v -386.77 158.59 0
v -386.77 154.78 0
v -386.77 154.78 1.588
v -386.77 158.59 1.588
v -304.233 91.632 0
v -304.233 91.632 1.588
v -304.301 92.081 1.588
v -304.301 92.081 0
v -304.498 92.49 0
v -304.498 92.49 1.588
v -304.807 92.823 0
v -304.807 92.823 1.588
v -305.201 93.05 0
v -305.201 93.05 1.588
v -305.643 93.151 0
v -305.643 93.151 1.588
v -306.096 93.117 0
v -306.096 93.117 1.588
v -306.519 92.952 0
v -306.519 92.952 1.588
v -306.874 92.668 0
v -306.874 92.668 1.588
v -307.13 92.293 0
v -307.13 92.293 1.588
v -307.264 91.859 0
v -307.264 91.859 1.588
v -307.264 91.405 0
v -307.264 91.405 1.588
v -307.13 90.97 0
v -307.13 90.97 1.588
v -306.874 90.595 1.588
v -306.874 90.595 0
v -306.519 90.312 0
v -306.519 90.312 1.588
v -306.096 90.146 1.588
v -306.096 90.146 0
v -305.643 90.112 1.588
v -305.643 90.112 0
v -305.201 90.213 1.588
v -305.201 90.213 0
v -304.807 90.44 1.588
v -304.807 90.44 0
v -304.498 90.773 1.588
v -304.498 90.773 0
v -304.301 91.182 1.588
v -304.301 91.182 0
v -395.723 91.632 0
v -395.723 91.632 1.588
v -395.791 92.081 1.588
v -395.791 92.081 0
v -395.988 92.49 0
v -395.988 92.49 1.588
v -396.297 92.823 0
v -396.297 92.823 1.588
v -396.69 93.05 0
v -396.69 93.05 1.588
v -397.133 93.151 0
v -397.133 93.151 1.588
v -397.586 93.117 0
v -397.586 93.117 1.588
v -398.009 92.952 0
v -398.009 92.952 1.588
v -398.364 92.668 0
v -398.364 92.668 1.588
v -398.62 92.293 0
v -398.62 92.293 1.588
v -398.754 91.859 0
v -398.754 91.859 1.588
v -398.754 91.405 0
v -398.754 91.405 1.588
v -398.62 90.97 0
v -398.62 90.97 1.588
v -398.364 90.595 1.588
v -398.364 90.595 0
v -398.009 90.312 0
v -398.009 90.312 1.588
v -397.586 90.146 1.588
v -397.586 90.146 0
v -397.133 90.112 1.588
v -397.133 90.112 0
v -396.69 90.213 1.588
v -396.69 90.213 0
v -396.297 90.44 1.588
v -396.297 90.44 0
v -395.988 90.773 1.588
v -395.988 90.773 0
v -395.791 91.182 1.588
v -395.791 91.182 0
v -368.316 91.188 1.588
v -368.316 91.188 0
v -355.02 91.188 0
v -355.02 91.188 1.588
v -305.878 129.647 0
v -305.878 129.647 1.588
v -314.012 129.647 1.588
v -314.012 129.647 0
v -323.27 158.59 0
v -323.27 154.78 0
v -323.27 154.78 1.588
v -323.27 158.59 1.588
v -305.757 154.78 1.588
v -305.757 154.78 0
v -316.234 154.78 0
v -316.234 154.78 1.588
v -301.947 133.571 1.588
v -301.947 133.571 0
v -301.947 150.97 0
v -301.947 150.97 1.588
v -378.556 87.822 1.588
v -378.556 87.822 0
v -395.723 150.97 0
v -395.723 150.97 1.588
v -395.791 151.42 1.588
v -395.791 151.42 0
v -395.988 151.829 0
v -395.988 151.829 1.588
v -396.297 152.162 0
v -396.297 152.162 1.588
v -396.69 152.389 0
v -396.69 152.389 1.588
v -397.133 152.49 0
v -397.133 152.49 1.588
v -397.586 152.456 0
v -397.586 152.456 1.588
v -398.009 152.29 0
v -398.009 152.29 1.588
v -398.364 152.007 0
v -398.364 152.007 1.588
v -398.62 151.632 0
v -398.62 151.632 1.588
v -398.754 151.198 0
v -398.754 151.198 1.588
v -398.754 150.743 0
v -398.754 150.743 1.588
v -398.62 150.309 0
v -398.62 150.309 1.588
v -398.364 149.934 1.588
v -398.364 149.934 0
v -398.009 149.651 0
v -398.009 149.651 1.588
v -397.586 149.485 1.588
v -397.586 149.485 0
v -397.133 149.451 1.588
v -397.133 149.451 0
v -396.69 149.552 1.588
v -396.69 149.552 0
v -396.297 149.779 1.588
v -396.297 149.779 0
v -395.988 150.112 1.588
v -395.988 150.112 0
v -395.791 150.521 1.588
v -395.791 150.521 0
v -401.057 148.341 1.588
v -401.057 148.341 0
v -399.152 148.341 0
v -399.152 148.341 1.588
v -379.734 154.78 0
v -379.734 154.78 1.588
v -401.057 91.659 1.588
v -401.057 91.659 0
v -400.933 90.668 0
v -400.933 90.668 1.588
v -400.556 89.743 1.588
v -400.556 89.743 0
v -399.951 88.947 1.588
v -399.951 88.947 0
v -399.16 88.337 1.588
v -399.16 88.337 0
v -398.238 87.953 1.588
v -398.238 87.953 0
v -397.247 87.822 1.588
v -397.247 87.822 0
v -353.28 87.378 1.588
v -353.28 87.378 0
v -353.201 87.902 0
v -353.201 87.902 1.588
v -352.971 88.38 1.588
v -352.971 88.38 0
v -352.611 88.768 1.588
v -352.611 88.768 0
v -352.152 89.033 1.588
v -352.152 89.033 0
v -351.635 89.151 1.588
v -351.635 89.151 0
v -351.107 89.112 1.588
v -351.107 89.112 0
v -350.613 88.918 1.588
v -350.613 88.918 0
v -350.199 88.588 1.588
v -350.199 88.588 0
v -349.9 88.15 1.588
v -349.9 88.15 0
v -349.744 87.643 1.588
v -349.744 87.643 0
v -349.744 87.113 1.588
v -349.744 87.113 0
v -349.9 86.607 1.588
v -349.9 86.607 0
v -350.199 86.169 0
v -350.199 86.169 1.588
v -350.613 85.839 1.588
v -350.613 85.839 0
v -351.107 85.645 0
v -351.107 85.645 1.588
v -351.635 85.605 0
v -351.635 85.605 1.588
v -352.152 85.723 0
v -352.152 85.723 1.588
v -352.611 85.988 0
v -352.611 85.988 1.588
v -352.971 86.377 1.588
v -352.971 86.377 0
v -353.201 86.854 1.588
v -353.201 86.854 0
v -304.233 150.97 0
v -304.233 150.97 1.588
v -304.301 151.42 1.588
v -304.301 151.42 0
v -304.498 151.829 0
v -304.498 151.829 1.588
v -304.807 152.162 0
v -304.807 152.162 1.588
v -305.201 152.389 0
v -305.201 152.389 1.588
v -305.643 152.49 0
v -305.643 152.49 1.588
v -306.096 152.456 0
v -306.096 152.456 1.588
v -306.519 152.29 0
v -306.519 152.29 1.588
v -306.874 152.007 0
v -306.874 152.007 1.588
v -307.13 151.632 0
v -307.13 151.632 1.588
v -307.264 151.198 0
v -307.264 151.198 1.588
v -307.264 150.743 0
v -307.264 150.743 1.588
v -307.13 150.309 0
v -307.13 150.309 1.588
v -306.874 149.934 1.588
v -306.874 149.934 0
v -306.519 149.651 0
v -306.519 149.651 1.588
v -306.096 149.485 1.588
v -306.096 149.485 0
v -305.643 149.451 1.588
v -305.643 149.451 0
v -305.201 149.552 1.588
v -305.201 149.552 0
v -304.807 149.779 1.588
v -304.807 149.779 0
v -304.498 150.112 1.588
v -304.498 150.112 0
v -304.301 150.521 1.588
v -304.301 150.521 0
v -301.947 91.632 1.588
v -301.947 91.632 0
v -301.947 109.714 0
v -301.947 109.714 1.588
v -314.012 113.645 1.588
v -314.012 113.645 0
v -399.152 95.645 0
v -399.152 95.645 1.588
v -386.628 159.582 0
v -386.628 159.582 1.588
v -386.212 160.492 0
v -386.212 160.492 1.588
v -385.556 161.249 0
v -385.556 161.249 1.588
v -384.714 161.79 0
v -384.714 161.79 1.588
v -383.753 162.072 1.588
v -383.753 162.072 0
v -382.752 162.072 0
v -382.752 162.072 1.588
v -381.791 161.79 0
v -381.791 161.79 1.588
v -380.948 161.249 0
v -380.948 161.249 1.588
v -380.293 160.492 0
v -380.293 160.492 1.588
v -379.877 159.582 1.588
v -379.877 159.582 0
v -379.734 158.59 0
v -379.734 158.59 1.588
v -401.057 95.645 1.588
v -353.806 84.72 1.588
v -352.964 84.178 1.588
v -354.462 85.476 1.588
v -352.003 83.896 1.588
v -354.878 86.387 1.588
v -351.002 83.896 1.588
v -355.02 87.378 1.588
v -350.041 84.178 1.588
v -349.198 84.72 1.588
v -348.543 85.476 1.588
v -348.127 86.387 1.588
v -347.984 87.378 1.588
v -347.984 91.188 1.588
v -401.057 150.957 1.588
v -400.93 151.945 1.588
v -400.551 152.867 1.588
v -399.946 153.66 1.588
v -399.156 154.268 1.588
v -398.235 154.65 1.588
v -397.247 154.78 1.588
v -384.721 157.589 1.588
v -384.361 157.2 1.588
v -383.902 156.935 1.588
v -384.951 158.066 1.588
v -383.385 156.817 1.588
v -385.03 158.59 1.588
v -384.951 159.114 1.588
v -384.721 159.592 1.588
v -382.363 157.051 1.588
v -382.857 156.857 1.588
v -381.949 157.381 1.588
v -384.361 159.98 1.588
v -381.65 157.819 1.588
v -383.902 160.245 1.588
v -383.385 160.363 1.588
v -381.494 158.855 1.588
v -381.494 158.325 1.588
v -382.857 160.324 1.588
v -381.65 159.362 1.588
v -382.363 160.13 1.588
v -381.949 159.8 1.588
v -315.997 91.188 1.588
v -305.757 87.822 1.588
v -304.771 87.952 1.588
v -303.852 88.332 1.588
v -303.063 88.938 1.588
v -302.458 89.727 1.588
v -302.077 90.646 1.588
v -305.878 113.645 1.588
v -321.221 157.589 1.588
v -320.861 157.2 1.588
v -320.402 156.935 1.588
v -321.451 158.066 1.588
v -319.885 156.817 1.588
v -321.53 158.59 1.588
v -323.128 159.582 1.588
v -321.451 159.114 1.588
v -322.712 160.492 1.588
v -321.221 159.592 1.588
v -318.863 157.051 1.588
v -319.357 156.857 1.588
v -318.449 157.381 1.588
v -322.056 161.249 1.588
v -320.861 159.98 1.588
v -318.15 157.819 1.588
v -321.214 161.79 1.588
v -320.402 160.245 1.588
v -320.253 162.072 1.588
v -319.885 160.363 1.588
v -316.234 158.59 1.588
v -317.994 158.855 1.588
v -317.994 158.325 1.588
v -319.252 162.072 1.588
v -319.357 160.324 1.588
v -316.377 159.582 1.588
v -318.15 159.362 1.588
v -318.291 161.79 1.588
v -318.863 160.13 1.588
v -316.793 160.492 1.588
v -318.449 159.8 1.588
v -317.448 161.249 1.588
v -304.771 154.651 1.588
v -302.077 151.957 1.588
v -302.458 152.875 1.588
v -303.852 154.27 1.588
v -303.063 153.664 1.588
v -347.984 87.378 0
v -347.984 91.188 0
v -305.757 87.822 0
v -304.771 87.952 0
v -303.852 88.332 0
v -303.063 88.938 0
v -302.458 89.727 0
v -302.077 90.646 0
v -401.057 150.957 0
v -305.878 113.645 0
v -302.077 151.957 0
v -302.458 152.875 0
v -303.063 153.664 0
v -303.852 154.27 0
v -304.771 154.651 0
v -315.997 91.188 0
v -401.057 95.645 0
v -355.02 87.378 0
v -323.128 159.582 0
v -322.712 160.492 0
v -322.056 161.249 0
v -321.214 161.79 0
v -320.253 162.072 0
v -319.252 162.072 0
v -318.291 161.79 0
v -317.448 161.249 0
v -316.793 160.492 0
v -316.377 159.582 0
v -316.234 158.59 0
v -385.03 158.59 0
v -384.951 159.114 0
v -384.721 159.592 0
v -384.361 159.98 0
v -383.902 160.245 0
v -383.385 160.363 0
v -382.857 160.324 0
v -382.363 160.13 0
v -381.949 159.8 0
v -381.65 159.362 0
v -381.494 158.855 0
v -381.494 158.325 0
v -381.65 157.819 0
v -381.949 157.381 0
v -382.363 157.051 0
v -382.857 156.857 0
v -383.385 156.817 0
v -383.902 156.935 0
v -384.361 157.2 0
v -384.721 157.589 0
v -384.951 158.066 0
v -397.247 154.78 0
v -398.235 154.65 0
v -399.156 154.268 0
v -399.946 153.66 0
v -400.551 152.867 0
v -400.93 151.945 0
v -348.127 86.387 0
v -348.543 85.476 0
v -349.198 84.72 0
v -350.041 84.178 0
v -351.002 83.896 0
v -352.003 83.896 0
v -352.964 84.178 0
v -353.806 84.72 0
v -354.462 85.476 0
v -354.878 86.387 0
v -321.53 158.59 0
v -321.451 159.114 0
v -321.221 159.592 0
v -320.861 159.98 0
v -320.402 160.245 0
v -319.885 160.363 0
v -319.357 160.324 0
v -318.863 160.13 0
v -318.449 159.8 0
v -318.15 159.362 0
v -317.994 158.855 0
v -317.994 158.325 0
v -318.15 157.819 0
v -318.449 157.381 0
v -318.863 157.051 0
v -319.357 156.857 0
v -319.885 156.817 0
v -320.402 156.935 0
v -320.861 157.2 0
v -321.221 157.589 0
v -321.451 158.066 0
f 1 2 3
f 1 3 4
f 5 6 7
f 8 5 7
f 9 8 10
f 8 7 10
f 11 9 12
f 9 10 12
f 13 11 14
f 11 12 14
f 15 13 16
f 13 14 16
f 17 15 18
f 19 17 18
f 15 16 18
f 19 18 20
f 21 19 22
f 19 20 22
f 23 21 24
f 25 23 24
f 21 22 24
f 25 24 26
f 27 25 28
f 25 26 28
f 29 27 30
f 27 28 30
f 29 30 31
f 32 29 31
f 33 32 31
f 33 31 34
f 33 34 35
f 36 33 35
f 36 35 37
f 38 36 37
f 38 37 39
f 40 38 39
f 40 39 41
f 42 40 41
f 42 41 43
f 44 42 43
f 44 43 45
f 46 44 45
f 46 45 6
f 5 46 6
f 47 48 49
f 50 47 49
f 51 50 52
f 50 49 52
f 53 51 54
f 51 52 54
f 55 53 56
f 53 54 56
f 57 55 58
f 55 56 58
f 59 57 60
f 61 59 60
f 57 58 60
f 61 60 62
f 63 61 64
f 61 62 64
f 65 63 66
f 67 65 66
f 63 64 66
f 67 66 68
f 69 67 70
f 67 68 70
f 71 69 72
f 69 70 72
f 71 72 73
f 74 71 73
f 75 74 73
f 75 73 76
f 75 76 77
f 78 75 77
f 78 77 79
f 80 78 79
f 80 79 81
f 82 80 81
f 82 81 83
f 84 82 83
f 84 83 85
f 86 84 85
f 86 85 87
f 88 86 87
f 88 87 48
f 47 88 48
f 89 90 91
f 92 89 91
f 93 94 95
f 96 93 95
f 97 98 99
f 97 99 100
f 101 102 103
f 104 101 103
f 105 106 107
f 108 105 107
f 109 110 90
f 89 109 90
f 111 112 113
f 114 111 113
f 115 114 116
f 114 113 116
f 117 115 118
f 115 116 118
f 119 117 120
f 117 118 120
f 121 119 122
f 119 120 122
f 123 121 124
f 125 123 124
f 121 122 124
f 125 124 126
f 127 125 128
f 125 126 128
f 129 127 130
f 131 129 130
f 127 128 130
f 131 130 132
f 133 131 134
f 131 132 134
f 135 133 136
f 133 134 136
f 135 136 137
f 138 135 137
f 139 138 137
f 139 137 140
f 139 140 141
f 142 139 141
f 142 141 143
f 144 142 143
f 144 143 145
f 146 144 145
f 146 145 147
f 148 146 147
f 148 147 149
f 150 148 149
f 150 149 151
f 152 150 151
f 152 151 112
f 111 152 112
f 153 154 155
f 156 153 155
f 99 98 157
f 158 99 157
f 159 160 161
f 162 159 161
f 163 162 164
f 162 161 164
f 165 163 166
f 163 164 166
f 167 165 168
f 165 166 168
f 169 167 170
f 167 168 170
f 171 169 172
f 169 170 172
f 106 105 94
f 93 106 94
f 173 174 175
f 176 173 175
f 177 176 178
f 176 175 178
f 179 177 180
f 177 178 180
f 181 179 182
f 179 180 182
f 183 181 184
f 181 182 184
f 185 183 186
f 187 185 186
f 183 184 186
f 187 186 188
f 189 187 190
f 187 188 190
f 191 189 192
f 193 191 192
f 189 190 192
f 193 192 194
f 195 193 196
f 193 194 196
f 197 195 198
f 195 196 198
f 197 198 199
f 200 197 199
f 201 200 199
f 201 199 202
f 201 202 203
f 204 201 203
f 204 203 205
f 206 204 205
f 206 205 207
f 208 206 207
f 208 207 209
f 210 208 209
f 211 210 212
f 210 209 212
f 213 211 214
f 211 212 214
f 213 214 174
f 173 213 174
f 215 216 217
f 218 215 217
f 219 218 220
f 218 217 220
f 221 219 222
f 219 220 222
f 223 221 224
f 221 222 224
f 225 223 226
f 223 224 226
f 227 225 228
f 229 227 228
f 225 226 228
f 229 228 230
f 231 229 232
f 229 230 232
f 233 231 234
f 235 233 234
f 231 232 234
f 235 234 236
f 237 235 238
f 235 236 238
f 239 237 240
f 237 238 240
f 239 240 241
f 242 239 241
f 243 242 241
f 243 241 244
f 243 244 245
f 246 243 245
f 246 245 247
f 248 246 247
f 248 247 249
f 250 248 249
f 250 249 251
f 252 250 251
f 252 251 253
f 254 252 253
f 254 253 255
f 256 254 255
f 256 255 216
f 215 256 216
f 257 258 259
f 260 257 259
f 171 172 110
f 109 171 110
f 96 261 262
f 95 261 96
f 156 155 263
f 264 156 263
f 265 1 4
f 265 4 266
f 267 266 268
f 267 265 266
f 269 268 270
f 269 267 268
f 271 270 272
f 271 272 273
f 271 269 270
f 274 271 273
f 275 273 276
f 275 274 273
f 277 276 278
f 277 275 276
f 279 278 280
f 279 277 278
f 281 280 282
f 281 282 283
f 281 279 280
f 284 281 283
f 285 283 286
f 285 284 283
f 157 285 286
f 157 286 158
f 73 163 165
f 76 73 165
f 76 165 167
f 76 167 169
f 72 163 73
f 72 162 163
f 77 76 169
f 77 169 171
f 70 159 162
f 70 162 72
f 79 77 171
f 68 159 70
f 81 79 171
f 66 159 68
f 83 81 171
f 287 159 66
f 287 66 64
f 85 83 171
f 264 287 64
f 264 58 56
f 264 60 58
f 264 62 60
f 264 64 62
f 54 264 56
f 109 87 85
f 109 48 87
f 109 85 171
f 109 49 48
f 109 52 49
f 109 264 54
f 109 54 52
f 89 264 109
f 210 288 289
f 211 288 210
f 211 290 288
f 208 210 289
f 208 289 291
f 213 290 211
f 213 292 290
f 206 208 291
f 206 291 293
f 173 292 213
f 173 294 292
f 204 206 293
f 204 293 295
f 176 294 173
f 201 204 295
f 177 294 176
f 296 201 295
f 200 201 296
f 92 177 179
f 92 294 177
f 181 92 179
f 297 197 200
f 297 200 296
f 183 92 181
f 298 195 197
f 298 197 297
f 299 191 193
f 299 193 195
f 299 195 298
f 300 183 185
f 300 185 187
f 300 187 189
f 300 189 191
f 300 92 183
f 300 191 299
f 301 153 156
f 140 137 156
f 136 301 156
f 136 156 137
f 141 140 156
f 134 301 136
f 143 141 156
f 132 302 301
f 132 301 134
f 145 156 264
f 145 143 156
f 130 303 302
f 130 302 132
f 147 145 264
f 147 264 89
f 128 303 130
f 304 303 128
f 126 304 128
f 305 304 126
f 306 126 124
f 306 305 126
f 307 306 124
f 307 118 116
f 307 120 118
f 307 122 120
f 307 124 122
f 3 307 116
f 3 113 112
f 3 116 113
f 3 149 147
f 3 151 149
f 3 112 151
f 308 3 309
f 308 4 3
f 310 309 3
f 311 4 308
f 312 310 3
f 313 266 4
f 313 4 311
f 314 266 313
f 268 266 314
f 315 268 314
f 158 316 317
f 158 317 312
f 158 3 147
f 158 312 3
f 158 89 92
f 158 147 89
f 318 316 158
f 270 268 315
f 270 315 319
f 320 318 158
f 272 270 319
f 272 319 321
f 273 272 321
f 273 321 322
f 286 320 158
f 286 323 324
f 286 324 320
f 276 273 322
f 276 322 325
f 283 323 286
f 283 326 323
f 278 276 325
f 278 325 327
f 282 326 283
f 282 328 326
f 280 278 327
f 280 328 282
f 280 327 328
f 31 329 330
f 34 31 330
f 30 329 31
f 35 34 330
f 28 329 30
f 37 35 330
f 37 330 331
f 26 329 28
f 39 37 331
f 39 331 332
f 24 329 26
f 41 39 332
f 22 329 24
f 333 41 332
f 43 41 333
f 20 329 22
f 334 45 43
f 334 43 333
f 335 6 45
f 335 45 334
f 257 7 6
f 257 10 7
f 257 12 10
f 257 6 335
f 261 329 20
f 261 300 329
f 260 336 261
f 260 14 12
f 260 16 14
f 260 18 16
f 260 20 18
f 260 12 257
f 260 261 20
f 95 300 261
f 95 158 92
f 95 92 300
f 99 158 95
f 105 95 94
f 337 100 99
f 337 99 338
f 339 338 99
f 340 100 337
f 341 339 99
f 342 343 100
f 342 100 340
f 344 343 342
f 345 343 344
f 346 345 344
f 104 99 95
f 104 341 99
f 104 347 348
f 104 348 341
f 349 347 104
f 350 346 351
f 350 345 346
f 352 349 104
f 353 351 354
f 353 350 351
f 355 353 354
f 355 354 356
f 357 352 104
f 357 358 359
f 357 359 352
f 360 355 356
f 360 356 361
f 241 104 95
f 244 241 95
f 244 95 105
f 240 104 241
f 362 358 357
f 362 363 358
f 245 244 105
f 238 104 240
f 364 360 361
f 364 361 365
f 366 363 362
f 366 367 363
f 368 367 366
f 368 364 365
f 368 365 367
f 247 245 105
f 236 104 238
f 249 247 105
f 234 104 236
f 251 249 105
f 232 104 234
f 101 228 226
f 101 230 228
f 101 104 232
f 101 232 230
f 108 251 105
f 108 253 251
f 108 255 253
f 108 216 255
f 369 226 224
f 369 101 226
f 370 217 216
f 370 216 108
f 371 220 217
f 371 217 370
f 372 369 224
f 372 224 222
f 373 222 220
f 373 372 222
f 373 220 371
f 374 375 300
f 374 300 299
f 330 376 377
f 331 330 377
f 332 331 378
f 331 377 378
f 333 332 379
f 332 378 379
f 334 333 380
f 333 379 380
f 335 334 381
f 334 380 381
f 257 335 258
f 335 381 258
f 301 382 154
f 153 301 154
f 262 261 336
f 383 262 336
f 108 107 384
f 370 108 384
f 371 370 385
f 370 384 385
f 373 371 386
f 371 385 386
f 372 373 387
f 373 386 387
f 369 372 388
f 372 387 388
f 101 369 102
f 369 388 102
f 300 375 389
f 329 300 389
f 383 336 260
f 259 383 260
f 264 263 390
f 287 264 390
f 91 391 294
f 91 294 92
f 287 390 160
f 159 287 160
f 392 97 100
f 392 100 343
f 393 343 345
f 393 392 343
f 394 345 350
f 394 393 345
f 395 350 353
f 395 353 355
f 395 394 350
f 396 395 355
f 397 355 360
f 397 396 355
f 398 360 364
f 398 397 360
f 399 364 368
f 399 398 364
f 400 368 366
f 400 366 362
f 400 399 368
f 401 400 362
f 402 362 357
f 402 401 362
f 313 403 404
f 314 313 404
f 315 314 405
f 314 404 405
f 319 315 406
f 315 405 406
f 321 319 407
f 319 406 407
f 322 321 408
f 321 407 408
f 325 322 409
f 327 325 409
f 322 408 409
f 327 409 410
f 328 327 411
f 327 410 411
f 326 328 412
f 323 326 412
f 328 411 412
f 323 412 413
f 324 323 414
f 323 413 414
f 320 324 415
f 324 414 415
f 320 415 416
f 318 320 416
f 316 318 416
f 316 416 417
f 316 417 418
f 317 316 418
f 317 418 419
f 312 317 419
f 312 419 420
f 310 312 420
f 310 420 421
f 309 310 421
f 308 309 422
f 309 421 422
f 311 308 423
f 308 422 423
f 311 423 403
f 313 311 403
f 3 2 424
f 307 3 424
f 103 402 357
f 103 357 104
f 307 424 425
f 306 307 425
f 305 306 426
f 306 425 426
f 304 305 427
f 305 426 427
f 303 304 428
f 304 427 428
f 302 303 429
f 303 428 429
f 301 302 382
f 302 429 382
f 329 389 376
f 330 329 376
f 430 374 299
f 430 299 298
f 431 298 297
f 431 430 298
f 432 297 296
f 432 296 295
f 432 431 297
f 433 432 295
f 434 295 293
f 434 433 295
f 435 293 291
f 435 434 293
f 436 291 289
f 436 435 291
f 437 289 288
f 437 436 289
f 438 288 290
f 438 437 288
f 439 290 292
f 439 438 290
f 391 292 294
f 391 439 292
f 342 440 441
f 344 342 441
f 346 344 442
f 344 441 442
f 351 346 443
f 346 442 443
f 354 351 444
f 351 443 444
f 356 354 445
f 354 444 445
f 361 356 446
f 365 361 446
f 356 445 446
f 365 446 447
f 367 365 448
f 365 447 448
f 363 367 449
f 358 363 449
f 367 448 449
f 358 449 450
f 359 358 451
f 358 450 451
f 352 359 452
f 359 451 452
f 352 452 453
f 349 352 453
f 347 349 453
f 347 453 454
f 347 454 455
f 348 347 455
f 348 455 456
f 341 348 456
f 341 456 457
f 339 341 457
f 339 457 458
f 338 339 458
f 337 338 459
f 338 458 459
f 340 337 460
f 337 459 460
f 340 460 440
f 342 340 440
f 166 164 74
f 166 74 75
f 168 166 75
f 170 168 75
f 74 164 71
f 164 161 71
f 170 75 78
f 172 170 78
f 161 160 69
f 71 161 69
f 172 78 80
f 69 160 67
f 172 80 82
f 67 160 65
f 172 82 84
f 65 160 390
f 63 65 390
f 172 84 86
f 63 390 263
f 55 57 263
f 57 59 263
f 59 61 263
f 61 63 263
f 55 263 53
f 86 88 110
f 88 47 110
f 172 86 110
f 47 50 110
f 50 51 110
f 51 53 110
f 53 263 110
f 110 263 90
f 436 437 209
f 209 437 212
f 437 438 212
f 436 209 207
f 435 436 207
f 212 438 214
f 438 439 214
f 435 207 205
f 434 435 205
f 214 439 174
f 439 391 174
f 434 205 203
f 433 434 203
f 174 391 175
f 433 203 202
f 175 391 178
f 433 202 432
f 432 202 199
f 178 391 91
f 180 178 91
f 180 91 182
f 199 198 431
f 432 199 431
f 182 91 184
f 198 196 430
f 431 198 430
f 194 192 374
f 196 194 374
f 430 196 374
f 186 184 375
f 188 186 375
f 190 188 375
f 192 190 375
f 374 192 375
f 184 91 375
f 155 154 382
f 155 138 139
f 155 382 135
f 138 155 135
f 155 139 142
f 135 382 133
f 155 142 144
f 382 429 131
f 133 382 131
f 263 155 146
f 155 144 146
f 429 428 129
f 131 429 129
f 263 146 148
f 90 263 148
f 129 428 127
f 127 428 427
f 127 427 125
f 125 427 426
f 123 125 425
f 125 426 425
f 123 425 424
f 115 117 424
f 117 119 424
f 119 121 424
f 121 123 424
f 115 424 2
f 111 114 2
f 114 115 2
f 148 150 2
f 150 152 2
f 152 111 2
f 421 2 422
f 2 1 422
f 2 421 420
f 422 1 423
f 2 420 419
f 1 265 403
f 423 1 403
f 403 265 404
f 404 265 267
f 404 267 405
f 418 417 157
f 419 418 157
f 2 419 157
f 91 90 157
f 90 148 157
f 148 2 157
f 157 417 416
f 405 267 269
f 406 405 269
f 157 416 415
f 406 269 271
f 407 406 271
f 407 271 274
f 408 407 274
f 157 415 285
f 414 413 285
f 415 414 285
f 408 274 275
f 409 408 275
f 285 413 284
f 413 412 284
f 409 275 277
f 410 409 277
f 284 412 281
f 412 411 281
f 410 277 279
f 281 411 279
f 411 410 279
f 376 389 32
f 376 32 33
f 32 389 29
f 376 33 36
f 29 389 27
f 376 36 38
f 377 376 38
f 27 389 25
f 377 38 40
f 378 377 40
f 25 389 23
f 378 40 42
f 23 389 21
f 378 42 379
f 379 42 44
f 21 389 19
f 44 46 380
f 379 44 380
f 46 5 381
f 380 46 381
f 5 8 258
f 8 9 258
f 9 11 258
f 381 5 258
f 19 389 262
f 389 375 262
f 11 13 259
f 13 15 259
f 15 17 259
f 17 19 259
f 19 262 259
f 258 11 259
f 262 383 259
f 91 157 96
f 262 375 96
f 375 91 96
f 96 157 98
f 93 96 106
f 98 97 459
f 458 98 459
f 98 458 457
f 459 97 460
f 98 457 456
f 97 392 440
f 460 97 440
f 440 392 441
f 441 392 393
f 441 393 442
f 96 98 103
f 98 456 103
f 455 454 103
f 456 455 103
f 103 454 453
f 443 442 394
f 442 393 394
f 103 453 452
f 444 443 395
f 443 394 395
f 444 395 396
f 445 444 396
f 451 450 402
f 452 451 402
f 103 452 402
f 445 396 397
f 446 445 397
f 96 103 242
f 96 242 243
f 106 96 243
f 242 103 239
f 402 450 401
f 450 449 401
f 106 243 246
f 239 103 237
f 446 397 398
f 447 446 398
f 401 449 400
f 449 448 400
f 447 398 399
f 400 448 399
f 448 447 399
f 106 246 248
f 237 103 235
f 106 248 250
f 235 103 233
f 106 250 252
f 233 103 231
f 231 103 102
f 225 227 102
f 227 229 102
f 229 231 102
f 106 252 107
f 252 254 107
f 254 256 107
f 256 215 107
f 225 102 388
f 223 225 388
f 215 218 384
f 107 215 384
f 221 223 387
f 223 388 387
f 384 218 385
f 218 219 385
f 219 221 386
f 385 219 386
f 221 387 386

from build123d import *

# Parameters (mm, degrees)
SKETCH1_R           = 1.355900406
BOSS_EXTRUDE1_DEPTH = 1.5875
SKETCH3_R           = 1.524
CUT_EXTRUDE1_DEPTH  = 430.891114182
SKETCH5_W           = 2.0955
SKETCH5_H           = 13.208
BOSS_EXTRUDE3_DEPTH = 1.5875
CUT_EXTRUDE2_DEPTH  = 430.891114182
SKETCH6_R           = 1.778
BOSS_EXTRUDE4_DEPTH = 1.5875


with BuildPart() as part:
    # Sketch1 → Boss-Extrude1 (new body)
    with BuildSketch(Plane.XY):
        with BuildLine():
            Line((-301.9473, 111.74645), (-305.87795, 115.6771))
            Line((-305.87795, 115.6771), (-316.1078, 115.6771))
            Line((-316.1078, 115.6771), (-316.1078, 128.8851))
            Line((-316.1078, 128.8851), (-305.87795, 128.8851))
            Line((-305.87795, 128.8851), (-301.9473, 132.81575))
            Line((-301.9473, 132.81575), (-301.9473, 150.9704))
            ThreePointArc((-301.9473, 150.9704), (-303.063223164, 153.664476836), (-305.7573, 154.7804))
            Line((-305.7573, 154.7804), (-397.247125, 154.7804))
            ThreePointArc((-397.247125, 154.7804), (-399.946077222, 153.659592612), (-401.0571, 150.956597849))
            Line((-401.0571, 150.956597849), (-401.0571, 148.341))
            Line((-401.0571, 148.341), (-399.1521, 148.341))
            Line((-399.1521, 148.341), (-399.1521, 95.6449))
            Line((-399.1521, 95.6449), (-401.0571, 95.6449))
            Line((-401.0571, 95.6449), (-401.0571, 91.659304166))
            ThreePointArc((-401.0571, 91.659304166), (-399.951018769, 88.947400452), (-397.2472, 87.8217))
            Line((-397.2472, 87.8217), (-378.5565, 87.8217))
            Line((-378.5565, 87.8217), (-368.3165, 91.1883))
            Line((-368.3165, 91.1883), (-315.9973, 91.1883))
            Line((-315.9973, 91.1883), (-305.7573, 87.8217))
            ThreePointArc((-305.7573, 87.8217), (-303.063223164, 88.937623164), (-301.9473, 91.6317))
            Line((-301.9473, 91.6317), (-301.9473, 111.74645))
        make_face()
        with Locations((-305.7573, 91.6317)):
            Circle(SKETCH1_R, mode=Mode.SUBTRACT)
        with Locations((-305.7573, 150.9704)):
            Circle(SKETCH1_R, mode=Mode.SUBTRACT)
        with Locations((-397.247125, 150.9704)):
            Circle(SKETCH1_R, mode=Mode.SUBTRACT)
        with Locations((-397.2472, 91.6317)):
            Circle(SKETCH1_R, mode=Mode.SUBTRACT)
    extrude(amount=BOSS_EXTRUDE1_DEPTH)

    # Sketch3 → Cut-Extrude1 (cut, through all)
    with BuildSketch(Plane.XY.offset(1.5875)):
        with Locations((-397.247125, 150.9704)):
            Circle(SKETCH3_R)
        with Locations((-305.7573, 150.9704)):
            Circle(SKETCH3_R)
        with Locations((-305.7573, 91.6317)):
            Circle(SKETCH3_R)
        with Locations((-397.2472, 91.6317)):
            Circle(SKETCH3_R)
    extrude(amount=-CUT_EXTRUDE1_DEPTH, mode=Mode.SUBTRACT)

    # Sketch5 → Boss-Extrude3 (add)
    with BuildSketch(Plane.XY.offset(1.5875)):
        with Locations((-315.06005, 122.2811)):
            Rectangle(SKETCH5_W, SKETCH5_H)
    extrude(amount=-BOSS_EXTRUDE3_DEPTH)

    # Sketch4 → Cut-Extrude2 (cut, through all)
    with BuildSketch(Plane.XY.offset(1.5875)):
        Polygon((-301.9473, 133.571034757), (-305.87795, 129.6471), (-314.0123, 129.6471), (-314.0123, 113.6451), (-305.87795, 113.6451), (-301.9473, 109.71445), align=None)
    extrude(amount=-CUT_EXTRUDE2_DEPTH, mode=Mode.SUBTRACT)

    # Sketch6 → Boss-Extrude4 (add)
    # profile 1 of 3: a face of its own
    with BuildSketch(Plane(origin=(0, 0, 0), x_dir=(-1, 0, 0), z_dir=(0, 0, -1))):
        with BuildLine():
            Line((386.7701125, 154.7804), (386.7701125, 158.5904))
            ThreePointArc((386.7701125, 158.5904), (383.2522125, 162.1083), (379.7343125, 158.5904))
            Line((379.7343125, 158.5904), (379.7343125, 154.7804))
            Line((379.7343125, 154.7804), (386.7701125, 154.7804))
        make_face()
        with Locations((383.2522125, 158.5904)):
            Circle(SKETCH6_R, mode=Mode.SUBTRACT)
    # profile 2 of 3: a face of its own
    with BuildSketch(Plane(origin=(0, 0, 0), x_dir=(-1, 0, 0), z_dir=(0, 0, -1))):
        with BuildLine():
            Line((347.9843125, 91.1883), (347.9843125, 87.3783))
            ThreePointArc((347.9843125, 87.3783), (351.5022125, 83.8604), (355.0201125, 87.3783))
            Line((355.0201125, 87.3783), (355.0201125, 91.1883))
            Line((355.0201125, 91.1883), (347.9843125, 91.1883))
        make_face()
        with Locations((351.5022125, 87.3783)):
            Circle(SKETCH6_R, mode=Mode.SUBTRACT)
    # profile 3 of 3: a face of its own
    with BuildSketch(Plane(origin=(0, 0, 0), x_dir=(-1, 0, 0), z_dir=(0, 0, -1))):
        with BuildLine():
            Line((316.2343125, 158.5904), (316.2343125, 154.7804))
            Line((316.2343125, 154.7804), (323.2701125, 154.7804))
            Line((323.2701125, 154.7804), (323.2701125, 158.5904))
            ThreePointArc((323.2701125, 158.5904), (319.7522125, 162.1083), (316.2343125, 158.5904))
        make_face()
        with Locations((319.7522125, 158.5904)):
            Circle(SKETCH6_R, mode=Mode.SUBTRACT)
    extrude(amount=-BOSS_EXTRUDE4_DEPTH)


solid = part.part
